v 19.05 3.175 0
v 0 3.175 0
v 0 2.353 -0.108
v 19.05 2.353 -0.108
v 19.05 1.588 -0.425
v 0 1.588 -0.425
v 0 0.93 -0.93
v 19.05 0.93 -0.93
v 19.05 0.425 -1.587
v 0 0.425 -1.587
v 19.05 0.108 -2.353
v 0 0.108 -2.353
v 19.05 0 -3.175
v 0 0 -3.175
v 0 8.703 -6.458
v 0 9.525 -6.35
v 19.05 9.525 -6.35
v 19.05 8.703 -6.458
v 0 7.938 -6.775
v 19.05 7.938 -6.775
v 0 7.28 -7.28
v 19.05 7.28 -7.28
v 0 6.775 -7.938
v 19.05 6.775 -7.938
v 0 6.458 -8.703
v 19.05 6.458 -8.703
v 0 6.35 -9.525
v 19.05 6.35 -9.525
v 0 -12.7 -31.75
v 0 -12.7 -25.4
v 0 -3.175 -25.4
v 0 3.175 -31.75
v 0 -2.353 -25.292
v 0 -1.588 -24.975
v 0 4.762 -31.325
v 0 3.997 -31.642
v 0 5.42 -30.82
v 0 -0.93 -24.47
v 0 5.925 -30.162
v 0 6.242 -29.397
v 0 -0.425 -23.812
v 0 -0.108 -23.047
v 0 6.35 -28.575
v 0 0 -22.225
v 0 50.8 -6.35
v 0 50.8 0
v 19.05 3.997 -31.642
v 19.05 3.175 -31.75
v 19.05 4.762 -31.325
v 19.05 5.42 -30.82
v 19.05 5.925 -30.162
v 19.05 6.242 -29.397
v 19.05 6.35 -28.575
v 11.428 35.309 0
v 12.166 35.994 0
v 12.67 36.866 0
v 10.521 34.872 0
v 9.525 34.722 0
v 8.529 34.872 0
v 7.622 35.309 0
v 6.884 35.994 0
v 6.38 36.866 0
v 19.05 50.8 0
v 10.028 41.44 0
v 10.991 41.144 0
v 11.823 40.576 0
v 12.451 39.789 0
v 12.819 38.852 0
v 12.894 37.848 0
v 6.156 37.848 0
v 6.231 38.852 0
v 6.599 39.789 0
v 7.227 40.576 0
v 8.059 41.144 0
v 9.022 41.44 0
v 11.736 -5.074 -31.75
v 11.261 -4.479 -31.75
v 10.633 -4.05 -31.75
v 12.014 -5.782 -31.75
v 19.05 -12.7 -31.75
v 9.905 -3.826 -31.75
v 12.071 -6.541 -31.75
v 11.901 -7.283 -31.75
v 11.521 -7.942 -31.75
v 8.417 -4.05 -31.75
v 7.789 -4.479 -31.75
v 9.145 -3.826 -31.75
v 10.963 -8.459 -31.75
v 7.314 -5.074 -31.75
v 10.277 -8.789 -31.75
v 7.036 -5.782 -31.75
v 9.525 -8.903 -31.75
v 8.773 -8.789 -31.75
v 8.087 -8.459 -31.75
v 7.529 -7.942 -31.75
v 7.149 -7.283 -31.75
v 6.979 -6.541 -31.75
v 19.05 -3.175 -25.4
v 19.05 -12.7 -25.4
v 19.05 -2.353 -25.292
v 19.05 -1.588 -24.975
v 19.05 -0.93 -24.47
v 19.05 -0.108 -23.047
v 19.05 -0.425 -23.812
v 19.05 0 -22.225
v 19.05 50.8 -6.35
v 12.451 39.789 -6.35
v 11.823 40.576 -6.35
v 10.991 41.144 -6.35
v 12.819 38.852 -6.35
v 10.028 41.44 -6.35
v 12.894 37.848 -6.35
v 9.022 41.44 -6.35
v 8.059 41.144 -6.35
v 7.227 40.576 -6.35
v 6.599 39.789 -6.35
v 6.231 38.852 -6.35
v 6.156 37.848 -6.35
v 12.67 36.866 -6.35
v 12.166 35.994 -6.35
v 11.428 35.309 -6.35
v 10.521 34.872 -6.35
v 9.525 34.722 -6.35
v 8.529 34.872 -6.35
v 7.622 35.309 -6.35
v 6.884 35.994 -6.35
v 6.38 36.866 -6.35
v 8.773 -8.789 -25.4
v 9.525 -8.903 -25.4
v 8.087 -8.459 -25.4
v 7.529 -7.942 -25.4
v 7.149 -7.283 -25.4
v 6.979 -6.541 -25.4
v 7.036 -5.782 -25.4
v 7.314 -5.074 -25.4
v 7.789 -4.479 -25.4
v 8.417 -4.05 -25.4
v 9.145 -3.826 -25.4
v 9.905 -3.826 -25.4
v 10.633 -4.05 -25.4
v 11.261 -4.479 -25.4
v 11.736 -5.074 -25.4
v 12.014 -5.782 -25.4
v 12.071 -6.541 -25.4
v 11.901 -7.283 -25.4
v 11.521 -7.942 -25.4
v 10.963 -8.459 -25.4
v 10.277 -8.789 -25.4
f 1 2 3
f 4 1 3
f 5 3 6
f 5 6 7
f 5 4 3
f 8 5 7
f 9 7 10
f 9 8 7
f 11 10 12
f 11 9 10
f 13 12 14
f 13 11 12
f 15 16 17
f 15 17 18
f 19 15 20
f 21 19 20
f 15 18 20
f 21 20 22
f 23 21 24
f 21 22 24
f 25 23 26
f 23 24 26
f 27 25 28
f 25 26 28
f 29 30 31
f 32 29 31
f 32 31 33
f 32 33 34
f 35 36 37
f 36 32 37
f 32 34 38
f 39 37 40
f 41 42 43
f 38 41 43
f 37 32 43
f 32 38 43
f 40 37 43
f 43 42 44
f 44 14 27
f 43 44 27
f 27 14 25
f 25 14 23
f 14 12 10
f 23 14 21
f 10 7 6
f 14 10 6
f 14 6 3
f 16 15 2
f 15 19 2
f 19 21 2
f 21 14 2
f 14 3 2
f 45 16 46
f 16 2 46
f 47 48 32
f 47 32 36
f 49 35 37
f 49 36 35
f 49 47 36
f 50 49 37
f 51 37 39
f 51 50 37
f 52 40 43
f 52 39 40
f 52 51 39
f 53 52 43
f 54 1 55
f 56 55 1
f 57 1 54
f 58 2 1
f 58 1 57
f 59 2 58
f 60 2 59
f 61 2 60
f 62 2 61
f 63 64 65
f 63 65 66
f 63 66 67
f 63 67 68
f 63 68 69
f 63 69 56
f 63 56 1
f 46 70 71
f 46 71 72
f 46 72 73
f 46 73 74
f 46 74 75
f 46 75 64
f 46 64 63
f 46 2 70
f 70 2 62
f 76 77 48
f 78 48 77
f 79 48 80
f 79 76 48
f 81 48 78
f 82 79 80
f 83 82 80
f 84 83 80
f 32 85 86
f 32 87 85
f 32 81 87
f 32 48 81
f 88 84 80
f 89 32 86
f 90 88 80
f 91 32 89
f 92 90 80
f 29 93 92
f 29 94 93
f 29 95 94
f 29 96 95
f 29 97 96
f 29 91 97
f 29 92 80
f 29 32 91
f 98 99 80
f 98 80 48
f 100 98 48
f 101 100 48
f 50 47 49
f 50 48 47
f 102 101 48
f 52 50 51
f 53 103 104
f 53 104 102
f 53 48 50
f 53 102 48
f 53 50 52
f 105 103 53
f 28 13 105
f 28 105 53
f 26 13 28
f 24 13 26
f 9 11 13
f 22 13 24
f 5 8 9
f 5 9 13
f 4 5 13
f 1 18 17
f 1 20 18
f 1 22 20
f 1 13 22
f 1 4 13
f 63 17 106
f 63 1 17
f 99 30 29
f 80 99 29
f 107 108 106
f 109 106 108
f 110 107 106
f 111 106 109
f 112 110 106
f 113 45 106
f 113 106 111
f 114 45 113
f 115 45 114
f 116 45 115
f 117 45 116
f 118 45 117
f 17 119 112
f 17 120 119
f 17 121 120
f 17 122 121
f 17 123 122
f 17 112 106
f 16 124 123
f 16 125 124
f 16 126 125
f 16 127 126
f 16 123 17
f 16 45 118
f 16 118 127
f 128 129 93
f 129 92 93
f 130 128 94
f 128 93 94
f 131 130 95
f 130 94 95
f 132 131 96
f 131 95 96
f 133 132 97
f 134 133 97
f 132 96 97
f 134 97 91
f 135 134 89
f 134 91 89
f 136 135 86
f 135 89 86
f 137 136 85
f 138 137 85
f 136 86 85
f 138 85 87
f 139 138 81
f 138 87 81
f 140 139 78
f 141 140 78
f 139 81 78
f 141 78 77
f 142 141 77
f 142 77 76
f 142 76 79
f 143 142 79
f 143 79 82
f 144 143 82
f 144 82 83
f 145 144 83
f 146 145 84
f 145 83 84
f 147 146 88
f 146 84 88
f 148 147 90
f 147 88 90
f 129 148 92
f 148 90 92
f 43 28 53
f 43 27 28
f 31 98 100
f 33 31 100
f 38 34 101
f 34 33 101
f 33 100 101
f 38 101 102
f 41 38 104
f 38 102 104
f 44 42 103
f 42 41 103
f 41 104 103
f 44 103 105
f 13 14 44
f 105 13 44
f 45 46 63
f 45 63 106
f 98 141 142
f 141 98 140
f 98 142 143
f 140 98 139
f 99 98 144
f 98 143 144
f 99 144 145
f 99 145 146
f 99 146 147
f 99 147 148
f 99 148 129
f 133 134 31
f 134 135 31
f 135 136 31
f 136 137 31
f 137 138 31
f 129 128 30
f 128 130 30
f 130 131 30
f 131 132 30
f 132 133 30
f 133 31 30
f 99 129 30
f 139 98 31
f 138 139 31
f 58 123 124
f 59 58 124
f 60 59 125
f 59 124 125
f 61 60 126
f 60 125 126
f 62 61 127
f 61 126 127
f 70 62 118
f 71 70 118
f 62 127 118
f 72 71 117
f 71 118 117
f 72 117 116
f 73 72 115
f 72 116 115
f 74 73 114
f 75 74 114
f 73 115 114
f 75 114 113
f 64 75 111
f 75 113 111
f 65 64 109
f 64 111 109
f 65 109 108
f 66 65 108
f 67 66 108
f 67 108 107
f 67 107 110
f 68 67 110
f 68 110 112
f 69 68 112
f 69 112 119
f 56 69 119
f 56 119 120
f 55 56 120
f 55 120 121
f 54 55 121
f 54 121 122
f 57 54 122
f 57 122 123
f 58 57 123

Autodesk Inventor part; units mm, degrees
ref_plane "YZ Plane" through (0, 0, 0) normal (1, 0, 0) x (0, 1, 0)
ref_plane "XZ Plane" through (0, 0, 0) normal (0, 1, 0) x (-1, 0, 0)
ref_plane "XY Plane" through (0, 0, 0) normal (0, 0, 1) x (1, 0, 0)
sketch "Sketch1" plane through (0, 0, 0) normal (1, 0, 0) x (0, 1, 0)
  line L0 (0, 0) -> (50.8, 0)
  line L1 (0, 0) -> (0, -25.4)
  line L2 (0, -25.4) -> (-12.7, -25.4)
  line L3 (50.8, -6.35) -> (6.35, -6.35)
  line L4 (6.35, -6.35) -> (6.35, -31.75)
  line L5 (6.35, -31.75) -> (-12.7, -31.75)
  line L6 (50.8, 0) -> (50.8, -6.35)
  line L7 (-12.7, -25.4) -> (-12.7, -31.75)
  dimension "d0" = 50.8
  dimension "d1" = 25.4
  dimension "d2" = 12.7
  dimension "d3" = 6.35
extrude "Extrusion1" add sketch "Sketch1" along normal blind 19.05
sketch "Sketch2" plane through (0, 0, 0) normal (0, 0, 1) x (1, 0, 0)
  line L0 (0, 50.8) -> (19.05, 50.8) construction
  line L1 (19.05, 6.35) -> (19.05, 50.8) construction
  point P0 (0, 0)
  point P1 (9.525, 38.1)
  point P2 (9.525, 50.8)
  point P3 (19.05, 28.575)
  dimension "d21" = 12.7
hole "Hole1" at (9.525, 38.1, 0) direction (0, 0, -1) diameter 6.7564 end through all clearance for "Flat Head Machine Screw (82)" size "1/4" standard "Ansi Unified Screw Threads"
sketch "Sketch3" plane through (0, -12.7, -25.4) normal (0, 0, 1) x (1, 0, 0)
  line L0 (0, 12.7) -> (0, 0) construction
  line L1 (0, 0) -> (19.05, 0) construction
  point P0 (9.525, 6.35)
  point P1 (0, 6.35)
  point P2 (9.525, 0)
hole "Hole2" at (9.525, -6.35, -25.4) direction (0, 0, -1) diameter 5.1054 end through all clearance for "Flat Head Machine Screw (82)" size "#10" standard "Ansi Unified Screw Threads"
fillet "Fillet1" radius 3.175 4 edges at (9.525, 6.35, -6.35) (9.525, 0, -25.4) (9.525, 6.35, -31.75) (9.525, 0, 0)
properties part number "EL2-030" material "ABS Plastic"
